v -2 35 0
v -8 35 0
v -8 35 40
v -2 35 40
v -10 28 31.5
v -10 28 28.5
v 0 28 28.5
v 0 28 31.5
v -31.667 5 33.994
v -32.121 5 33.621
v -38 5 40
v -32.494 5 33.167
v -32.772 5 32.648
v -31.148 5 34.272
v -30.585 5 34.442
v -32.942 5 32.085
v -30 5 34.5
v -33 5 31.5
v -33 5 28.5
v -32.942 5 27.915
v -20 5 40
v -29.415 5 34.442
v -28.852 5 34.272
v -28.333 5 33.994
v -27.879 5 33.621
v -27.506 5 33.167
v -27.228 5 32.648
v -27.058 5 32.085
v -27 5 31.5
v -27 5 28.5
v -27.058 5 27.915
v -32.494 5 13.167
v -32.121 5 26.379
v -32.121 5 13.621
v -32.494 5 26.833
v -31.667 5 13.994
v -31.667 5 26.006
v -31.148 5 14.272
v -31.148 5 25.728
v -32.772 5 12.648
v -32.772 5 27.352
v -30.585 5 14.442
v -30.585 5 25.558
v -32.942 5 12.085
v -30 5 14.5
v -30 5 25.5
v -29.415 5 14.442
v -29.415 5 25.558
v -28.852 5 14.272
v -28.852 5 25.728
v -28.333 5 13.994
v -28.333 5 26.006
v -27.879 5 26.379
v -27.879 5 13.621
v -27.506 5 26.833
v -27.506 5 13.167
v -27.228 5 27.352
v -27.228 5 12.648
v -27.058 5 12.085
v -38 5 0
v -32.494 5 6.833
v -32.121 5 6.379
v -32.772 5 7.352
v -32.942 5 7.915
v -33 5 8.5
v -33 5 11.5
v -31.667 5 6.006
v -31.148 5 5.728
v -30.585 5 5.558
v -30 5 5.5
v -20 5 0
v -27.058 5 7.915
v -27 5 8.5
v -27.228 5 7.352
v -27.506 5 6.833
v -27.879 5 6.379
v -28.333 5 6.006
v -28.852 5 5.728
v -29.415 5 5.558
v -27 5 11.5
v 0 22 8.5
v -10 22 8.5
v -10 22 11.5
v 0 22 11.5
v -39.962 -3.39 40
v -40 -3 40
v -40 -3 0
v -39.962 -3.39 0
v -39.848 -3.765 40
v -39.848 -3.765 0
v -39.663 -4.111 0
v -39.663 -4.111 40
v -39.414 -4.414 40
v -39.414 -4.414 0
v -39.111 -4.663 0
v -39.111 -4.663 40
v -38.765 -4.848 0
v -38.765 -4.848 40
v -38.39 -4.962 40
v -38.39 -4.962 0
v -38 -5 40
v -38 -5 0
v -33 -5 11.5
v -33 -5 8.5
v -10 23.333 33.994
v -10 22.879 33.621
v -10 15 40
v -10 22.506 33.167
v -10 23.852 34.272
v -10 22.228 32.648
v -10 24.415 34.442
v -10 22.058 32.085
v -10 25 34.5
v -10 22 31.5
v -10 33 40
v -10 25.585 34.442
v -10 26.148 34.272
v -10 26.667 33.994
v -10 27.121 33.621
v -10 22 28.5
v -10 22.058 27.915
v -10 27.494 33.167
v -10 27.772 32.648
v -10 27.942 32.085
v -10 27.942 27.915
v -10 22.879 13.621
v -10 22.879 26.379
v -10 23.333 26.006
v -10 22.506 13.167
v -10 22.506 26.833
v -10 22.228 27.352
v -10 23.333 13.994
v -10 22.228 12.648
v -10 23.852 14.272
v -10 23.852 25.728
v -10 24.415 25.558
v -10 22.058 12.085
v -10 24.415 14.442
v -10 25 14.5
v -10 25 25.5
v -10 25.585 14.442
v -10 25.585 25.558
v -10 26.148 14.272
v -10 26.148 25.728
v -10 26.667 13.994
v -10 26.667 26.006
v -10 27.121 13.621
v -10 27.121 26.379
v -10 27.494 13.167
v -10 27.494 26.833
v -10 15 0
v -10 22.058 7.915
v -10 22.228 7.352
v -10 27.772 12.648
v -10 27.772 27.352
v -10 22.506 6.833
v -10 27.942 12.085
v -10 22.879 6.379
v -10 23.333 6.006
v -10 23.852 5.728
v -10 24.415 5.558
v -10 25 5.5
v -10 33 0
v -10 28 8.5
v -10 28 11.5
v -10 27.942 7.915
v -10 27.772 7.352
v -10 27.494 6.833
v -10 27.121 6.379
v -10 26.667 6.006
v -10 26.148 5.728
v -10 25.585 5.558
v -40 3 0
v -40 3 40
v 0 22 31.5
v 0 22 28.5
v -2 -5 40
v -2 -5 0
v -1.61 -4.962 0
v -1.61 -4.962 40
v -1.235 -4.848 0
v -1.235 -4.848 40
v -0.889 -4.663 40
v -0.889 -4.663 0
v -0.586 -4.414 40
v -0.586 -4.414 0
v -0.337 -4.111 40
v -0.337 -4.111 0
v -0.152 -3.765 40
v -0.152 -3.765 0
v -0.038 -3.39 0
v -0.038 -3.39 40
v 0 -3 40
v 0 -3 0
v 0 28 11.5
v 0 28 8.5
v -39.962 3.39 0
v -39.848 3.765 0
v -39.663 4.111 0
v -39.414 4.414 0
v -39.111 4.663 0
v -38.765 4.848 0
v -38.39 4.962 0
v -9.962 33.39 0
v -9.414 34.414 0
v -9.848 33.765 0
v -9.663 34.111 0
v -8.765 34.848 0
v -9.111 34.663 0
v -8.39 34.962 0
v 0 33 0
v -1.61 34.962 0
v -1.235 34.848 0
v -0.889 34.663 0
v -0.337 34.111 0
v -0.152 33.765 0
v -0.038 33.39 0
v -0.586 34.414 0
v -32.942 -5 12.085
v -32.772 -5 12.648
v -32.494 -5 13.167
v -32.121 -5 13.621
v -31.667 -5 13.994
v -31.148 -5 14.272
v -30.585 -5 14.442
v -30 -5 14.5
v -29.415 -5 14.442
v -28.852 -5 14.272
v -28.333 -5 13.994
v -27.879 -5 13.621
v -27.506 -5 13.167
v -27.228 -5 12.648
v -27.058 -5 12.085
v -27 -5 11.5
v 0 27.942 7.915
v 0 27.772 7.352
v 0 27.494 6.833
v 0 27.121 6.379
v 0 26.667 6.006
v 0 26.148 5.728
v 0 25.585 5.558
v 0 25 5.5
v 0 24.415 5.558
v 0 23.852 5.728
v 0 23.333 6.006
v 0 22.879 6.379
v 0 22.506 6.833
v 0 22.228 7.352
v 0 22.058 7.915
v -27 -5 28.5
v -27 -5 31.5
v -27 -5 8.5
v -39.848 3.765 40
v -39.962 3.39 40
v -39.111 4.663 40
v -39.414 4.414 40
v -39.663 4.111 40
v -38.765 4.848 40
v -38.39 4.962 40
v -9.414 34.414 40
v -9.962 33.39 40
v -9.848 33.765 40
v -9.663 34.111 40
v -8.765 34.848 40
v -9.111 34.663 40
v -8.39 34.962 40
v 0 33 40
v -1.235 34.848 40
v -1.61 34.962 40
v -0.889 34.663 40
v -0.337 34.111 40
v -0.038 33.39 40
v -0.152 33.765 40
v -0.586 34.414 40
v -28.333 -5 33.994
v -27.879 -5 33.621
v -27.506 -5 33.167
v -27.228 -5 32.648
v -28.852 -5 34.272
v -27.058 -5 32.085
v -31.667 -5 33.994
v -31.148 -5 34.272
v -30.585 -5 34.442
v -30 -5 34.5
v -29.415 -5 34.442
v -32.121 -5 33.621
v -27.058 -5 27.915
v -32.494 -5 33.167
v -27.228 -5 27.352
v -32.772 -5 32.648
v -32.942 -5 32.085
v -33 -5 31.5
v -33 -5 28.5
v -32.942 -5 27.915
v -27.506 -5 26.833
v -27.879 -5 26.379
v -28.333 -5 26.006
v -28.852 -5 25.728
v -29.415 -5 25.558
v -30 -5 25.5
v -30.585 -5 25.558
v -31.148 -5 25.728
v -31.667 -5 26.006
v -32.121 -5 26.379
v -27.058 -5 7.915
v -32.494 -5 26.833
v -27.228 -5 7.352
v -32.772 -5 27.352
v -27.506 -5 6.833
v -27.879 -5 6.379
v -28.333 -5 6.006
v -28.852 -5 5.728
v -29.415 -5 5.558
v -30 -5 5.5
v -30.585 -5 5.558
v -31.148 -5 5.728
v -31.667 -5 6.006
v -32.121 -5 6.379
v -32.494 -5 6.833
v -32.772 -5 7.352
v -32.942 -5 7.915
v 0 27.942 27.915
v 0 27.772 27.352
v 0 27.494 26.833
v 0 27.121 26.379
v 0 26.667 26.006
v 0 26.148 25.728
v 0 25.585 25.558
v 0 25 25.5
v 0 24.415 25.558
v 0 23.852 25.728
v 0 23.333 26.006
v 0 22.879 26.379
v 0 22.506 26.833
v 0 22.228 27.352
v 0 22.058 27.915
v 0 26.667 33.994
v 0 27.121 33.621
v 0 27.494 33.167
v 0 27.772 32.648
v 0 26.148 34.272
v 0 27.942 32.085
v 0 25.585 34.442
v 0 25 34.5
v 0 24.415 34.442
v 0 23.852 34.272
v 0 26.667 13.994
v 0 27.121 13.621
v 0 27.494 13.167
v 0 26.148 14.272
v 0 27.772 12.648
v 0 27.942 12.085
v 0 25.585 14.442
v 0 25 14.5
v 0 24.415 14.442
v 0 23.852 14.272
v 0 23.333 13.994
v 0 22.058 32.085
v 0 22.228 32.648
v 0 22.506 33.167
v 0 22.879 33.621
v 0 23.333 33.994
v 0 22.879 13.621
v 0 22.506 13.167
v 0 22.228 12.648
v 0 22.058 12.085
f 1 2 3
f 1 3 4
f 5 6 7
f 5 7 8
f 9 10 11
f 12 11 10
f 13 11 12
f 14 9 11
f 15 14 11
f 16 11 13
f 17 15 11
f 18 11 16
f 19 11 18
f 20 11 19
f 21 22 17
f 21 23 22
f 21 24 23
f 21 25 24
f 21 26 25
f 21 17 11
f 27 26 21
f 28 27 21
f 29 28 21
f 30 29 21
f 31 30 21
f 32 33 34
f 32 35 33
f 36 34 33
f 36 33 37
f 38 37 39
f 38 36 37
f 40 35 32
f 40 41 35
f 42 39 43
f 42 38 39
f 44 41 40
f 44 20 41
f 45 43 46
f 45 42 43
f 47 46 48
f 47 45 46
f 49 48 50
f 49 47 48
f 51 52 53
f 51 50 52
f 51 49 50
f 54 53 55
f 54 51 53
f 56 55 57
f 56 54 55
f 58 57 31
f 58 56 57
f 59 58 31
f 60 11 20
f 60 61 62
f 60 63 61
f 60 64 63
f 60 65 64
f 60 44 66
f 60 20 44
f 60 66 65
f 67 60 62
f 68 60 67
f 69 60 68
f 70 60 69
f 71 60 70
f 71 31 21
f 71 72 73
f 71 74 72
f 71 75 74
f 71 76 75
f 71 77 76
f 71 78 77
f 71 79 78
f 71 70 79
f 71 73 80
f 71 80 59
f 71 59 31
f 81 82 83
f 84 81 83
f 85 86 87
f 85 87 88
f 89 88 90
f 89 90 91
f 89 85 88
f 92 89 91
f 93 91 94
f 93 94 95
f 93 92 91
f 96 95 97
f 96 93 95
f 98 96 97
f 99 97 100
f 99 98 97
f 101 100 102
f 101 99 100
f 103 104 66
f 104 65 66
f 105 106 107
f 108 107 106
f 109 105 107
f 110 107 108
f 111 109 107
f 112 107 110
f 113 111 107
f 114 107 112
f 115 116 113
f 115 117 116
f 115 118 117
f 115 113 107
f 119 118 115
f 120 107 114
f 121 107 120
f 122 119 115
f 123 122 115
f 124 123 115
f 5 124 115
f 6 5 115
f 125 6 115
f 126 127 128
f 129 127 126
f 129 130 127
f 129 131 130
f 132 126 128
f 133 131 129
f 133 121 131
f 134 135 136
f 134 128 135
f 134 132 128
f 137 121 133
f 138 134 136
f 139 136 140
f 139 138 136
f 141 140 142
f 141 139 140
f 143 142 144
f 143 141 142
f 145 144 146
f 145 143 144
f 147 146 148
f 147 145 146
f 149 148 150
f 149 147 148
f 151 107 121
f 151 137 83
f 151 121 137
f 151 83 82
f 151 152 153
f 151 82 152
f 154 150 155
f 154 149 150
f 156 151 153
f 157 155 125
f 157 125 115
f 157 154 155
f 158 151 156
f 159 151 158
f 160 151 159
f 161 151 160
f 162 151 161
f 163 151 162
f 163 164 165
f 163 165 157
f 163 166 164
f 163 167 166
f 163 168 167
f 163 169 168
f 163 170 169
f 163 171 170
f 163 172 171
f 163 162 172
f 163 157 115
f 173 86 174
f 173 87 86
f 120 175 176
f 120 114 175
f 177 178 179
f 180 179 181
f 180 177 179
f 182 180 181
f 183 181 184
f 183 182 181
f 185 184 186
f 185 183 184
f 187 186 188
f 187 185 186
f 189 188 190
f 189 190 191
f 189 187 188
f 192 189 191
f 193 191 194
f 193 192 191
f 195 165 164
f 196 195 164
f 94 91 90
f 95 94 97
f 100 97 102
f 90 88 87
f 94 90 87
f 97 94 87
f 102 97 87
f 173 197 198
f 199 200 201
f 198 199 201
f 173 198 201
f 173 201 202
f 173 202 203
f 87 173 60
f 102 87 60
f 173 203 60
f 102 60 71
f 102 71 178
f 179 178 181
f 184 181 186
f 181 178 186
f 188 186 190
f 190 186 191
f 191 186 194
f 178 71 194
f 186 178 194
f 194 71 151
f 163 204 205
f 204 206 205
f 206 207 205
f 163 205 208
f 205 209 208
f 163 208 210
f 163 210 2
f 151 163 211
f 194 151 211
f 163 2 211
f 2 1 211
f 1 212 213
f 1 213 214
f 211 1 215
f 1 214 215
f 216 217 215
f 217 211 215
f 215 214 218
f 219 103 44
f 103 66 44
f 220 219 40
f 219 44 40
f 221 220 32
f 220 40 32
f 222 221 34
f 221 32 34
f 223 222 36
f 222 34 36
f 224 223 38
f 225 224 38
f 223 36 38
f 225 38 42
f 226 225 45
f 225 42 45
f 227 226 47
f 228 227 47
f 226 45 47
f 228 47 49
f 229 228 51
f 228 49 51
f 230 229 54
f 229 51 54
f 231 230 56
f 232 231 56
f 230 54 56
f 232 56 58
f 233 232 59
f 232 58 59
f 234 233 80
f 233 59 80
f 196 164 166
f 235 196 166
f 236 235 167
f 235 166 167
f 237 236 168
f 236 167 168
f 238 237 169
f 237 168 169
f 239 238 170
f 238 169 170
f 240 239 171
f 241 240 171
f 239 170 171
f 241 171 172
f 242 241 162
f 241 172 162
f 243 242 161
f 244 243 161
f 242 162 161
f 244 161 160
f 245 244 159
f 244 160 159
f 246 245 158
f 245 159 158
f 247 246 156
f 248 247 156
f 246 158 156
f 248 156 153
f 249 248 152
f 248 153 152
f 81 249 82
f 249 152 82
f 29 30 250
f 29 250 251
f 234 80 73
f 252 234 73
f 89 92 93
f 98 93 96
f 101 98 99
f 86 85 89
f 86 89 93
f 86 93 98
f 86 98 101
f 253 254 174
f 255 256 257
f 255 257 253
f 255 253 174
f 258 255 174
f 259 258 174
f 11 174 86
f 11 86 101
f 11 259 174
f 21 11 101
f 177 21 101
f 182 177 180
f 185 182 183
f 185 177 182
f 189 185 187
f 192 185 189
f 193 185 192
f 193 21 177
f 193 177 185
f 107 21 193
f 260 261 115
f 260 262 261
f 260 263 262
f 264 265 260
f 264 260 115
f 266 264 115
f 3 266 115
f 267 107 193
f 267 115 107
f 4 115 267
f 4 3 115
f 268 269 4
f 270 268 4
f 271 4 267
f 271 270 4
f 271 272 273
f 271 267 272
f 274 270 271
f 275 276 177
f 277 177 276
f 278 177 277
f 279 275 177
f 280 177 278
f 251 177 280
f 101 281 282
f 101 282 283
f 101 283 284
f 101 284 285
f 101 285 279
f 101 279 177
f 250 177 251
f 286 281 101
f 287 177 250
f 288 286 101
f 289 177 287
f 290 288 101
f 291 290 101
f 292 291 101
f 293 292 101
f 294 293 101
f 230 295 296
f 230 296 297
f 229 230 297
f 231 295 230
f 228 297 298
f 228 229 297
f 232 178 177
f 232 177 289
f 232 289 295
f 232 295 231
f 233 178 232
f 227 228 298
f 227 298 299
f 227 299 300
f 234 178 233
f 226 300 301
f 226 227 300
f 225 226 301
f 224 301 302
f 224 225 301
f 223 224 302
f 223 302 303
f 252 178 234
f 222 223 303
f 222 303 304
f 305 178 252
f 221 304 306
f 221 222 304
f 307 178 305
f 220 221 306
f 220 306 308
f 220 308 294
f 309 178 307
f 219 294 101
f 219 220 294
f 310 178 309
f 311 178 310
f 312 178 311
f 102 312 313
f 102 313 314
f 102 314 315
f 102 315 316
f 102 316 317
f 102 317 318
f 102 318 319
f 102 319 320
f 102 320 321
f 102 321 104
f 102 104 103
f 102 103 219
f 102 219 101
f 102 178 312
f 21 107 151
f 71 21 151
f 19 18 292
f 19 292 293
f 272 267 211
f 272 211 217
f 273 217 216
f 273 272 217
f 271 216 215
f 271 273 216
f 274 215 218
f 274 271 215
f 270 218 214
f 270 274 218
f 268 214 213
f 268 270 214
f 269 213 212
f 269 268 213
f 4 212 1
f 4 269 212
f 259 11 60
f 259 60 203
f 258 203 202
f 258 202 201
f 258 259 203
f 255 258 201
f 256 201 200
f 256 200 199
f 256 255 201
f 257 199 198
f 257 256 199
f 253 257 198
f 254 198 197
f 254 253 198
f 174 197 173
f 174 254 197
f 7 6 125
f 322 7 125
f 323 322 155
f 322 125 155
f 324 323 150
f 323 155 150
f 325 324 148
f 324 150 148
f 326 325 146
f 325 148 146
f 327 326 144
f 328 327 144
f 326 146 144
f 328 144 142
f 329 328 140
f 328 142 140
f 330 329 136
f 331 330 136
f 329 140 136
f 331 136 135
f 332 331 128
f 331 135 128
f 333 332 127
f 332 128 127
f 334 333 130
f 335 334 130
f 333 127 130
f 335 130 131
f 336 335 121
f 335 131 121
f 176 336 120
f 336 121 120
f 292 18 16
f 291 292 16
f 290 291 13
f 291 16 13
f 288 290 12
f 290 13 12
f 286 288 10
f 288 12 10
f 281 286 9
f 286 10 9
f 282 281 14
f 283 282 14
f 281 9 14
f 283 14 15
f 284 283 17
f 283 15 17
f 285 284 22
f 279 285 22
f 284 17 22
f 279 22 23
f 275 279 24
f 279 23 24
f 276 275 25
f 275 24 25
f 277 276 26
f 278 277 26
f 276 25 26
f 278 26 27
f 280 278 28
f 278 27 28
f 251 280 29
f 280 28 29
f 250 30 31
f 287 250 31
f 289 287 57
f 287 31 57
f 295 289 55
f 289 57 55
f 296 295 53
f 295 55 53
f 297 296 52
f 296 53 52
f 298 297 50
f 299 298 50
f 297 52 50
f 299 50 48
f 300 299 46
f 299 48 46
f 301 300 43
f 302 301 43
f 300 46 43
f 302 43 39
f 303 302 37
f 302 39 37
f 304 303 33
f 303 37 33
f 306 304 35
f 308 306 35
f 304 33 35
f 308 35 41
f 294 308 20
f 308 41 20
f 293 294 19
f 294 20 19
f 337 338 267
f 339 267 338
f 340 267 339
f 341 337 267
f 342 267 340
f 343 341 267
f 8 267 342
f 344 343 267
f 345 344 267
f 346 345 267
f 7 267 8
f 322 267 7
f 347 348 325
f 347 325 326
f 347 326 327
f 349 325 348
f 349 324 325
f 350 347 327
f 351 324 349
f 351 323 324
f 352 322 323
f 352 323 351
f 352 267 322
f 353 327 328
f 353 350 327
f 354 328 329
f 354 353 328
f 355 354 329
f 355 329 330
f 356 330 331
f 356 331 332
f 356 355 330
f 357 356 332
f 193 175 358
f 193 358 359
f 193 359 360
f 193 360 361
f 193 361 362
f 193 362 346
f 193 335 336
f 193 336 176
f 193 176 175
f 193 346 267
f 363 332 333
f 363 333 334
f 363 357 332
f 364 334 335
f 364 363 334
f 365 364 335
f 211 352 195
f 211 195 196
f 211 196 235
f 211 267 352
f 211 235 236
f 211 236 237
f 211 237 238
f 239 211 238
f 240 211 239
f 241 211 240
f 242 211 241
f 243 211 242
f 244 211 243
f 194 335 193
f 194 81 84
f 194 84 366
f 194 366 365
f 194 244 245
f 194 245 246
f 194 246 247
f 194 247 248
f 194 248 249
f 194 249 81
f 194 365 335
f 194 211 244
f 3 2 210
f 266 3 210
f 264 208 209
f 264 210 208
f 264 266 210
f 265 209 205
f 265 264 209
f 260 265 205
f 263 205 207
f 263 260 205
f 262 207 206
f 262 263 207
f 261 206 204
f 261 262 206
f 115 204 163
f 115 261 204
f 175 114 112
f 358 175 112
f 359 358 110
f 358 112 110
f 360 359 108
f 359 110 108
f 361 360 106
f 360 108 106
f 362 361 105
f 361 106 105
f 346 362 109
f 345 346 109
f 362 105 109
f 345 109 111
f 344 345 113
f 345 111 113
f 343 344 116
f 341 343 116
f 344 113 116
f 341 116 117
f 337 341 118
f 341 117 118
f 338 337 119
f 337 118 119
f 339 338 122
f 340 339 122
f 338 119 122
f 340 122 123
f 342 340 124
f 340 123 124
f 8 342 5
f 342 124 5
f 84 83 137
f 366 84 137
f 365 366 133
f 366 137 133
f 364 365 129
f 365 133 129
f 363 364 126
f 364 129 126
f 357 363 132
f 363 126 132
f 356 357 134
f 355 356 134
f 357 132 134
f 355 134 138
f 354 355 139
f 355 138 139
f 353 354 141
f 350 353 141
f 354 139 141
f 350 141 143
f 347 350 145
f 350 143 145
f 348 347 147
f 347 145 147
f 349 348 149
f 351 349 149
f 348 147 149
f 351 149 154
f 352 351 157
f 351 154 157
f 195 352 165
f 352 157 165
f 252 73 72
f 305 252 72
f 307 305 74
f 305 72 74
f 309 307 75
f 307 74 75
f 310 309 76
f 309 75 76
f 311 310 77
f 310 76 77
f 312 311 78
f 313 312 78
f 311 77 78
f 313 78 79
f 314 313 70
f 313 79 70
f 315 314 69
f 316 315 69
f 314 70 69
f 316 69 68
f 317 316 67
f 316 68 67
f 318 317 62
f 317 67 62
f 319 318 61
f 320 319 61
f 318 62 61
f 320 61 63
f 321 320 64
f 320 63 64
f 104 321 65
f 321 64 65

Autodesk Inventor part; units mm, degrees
ref_plane "YZ Plane" through (0, 0, 0) normal (1, 0, 0) x (0, 1, 0)
ref_plane "XZ Plane" through (0, 0, 0) normal (0, 1, 0) x (-1, 0, 0)
ref_plane "XY Plane" through (0, 0, 0) normal (0, 0, 1) x (1, 0, 0)
sketch "Sketch1" plane through (0, 0, 0) normal (0, 0, 1) x (1, 0, 0)
  line L0 (-40, 5) -> (0, 5)
  line L1 (0, 5) -> (0, -5)
  line L2 (0, -5) -> (-40, -5)
  line L3 (-40, -5) -> (-40, 5)
  line L4 (-10, 35) -> (0, 35)
  line L5 (0, 35) -> (0, 5)
  line L6 (0, 5) -> (-10, 5)
  line L7 (-10, 5) -> (-10, 35)
  point P0 (0, 0)
  point P1 (0, 5)
  dimension "d0" = 10
  dimension "d1" = 40
  dimension "d2" = 40
extrude "Extrusion1" add sketch "Sketch1" along normal blind 40
sketch "Sketch2" plane through (-10, 5, 0) normal (-1, 0, 0) x (0, 0, 1)
  line L0 (8.5, 20) -> (11.5, 20) construction
  line L1 (8.5, 17) -> (11.5, 17)
  line L2 (11.5, 23) -> (8.5, 23)
  arc A0 (8.5, 23) -> (8.5, 17) centre (8.5, 20) ccw
  arc A1 (11.5, 17) -> (11.5, 23) centre (11.5, 20) ccw
  line L3 (0, 30) -> (0, 0) projected
  line L4 (0, 30) -> (40, 30) projected
  line L5 (20, 21.547) -> (20, 15) construction
  line L6 (31.5, 20) -> (28.5, 20) construction
  line L7 (31.5, 17) -> (28.5, 17)
  line L8 (28.5, 23) -> (31.5, 23)
  arc A2 (31.5, 17) -> (31.5, 23) centre (31.5, 20) ccw
  arc A3 (28.5, 23) -> (28.5, 17) centre (28.5, 20) ccw
  point P0 (0, -5)
  point P1 (10, 20)
  point P2 (20, 18.2735)
  point P3 (20, 30)
  point P4 (30, 20)
  dimension "d5" = 6
  dimension "d6" = 3
  dimension "d7" = 10
  dimension "d8" = 10
extrude "Extrusion2" cut sketch "Sketch2" against normal through all
sketch "Sketch3" plane through (-40, 5, 0) normal (0, 1, 0) x (1, 0, 0)
  line L0 (10, -8.5) -> (10, -11.5) construction
  line L1 (7, -8.5) -> (7, -11.5)
  line L2 (13, -11.5) -> (13, -8.5)
  arc A0 (13, -8.5) -> (7, -8.5) centre (10, -8.5) ccw
  arc A1 (7, -11.5) -> (13, -11.5) centre (10, -11.5) ccw
  line L3 (30, 0) -> (0, 0) projected
  line L4 (0, 0) -> (0, -40) projected
  line L5 (15.2557, -20) -> (9.287, -20) construction
  line L6 (10, -31.5) -> (10, -28.5) construction
  line L7 (7, -31.5) -> (7, -28.5)
  line L8 (13, -28.5) -> (13, -31.5)
  arc A2 (7, -31.5) -> (13, -31.5) centre (10, -31.5) ccw
  arc A3 (13, -28.5) -> (7, -28.5) centre (10, -28.5) ccw
  point P0 (40, 0)
  point P1 (10, -10)
  point P2 (12.2713, -20)
  point P3 (0, -20)
  point P4 (10, -30)
  dimension "d11" = 3
  dimension "d12" = 6
  dimension "d13" = 10
  dimension "d14" = 10
extrude "Extrusion3" cut sketch "Sketch3" against normal through all
chamfer "Chamfer1" distance 10 angle 45 1 edges at (-10, 5, 20)
fillet "Fillet1" radius 2 5 edges at (-10, 35, 20) (0, 35, 20) (0, -5, 20) (-40, -5, 20) (-40, 5, 20)
equation "\"d2\" = d1"
properties part number "0008-10-022 Suport L" material "ABS Plastic"
